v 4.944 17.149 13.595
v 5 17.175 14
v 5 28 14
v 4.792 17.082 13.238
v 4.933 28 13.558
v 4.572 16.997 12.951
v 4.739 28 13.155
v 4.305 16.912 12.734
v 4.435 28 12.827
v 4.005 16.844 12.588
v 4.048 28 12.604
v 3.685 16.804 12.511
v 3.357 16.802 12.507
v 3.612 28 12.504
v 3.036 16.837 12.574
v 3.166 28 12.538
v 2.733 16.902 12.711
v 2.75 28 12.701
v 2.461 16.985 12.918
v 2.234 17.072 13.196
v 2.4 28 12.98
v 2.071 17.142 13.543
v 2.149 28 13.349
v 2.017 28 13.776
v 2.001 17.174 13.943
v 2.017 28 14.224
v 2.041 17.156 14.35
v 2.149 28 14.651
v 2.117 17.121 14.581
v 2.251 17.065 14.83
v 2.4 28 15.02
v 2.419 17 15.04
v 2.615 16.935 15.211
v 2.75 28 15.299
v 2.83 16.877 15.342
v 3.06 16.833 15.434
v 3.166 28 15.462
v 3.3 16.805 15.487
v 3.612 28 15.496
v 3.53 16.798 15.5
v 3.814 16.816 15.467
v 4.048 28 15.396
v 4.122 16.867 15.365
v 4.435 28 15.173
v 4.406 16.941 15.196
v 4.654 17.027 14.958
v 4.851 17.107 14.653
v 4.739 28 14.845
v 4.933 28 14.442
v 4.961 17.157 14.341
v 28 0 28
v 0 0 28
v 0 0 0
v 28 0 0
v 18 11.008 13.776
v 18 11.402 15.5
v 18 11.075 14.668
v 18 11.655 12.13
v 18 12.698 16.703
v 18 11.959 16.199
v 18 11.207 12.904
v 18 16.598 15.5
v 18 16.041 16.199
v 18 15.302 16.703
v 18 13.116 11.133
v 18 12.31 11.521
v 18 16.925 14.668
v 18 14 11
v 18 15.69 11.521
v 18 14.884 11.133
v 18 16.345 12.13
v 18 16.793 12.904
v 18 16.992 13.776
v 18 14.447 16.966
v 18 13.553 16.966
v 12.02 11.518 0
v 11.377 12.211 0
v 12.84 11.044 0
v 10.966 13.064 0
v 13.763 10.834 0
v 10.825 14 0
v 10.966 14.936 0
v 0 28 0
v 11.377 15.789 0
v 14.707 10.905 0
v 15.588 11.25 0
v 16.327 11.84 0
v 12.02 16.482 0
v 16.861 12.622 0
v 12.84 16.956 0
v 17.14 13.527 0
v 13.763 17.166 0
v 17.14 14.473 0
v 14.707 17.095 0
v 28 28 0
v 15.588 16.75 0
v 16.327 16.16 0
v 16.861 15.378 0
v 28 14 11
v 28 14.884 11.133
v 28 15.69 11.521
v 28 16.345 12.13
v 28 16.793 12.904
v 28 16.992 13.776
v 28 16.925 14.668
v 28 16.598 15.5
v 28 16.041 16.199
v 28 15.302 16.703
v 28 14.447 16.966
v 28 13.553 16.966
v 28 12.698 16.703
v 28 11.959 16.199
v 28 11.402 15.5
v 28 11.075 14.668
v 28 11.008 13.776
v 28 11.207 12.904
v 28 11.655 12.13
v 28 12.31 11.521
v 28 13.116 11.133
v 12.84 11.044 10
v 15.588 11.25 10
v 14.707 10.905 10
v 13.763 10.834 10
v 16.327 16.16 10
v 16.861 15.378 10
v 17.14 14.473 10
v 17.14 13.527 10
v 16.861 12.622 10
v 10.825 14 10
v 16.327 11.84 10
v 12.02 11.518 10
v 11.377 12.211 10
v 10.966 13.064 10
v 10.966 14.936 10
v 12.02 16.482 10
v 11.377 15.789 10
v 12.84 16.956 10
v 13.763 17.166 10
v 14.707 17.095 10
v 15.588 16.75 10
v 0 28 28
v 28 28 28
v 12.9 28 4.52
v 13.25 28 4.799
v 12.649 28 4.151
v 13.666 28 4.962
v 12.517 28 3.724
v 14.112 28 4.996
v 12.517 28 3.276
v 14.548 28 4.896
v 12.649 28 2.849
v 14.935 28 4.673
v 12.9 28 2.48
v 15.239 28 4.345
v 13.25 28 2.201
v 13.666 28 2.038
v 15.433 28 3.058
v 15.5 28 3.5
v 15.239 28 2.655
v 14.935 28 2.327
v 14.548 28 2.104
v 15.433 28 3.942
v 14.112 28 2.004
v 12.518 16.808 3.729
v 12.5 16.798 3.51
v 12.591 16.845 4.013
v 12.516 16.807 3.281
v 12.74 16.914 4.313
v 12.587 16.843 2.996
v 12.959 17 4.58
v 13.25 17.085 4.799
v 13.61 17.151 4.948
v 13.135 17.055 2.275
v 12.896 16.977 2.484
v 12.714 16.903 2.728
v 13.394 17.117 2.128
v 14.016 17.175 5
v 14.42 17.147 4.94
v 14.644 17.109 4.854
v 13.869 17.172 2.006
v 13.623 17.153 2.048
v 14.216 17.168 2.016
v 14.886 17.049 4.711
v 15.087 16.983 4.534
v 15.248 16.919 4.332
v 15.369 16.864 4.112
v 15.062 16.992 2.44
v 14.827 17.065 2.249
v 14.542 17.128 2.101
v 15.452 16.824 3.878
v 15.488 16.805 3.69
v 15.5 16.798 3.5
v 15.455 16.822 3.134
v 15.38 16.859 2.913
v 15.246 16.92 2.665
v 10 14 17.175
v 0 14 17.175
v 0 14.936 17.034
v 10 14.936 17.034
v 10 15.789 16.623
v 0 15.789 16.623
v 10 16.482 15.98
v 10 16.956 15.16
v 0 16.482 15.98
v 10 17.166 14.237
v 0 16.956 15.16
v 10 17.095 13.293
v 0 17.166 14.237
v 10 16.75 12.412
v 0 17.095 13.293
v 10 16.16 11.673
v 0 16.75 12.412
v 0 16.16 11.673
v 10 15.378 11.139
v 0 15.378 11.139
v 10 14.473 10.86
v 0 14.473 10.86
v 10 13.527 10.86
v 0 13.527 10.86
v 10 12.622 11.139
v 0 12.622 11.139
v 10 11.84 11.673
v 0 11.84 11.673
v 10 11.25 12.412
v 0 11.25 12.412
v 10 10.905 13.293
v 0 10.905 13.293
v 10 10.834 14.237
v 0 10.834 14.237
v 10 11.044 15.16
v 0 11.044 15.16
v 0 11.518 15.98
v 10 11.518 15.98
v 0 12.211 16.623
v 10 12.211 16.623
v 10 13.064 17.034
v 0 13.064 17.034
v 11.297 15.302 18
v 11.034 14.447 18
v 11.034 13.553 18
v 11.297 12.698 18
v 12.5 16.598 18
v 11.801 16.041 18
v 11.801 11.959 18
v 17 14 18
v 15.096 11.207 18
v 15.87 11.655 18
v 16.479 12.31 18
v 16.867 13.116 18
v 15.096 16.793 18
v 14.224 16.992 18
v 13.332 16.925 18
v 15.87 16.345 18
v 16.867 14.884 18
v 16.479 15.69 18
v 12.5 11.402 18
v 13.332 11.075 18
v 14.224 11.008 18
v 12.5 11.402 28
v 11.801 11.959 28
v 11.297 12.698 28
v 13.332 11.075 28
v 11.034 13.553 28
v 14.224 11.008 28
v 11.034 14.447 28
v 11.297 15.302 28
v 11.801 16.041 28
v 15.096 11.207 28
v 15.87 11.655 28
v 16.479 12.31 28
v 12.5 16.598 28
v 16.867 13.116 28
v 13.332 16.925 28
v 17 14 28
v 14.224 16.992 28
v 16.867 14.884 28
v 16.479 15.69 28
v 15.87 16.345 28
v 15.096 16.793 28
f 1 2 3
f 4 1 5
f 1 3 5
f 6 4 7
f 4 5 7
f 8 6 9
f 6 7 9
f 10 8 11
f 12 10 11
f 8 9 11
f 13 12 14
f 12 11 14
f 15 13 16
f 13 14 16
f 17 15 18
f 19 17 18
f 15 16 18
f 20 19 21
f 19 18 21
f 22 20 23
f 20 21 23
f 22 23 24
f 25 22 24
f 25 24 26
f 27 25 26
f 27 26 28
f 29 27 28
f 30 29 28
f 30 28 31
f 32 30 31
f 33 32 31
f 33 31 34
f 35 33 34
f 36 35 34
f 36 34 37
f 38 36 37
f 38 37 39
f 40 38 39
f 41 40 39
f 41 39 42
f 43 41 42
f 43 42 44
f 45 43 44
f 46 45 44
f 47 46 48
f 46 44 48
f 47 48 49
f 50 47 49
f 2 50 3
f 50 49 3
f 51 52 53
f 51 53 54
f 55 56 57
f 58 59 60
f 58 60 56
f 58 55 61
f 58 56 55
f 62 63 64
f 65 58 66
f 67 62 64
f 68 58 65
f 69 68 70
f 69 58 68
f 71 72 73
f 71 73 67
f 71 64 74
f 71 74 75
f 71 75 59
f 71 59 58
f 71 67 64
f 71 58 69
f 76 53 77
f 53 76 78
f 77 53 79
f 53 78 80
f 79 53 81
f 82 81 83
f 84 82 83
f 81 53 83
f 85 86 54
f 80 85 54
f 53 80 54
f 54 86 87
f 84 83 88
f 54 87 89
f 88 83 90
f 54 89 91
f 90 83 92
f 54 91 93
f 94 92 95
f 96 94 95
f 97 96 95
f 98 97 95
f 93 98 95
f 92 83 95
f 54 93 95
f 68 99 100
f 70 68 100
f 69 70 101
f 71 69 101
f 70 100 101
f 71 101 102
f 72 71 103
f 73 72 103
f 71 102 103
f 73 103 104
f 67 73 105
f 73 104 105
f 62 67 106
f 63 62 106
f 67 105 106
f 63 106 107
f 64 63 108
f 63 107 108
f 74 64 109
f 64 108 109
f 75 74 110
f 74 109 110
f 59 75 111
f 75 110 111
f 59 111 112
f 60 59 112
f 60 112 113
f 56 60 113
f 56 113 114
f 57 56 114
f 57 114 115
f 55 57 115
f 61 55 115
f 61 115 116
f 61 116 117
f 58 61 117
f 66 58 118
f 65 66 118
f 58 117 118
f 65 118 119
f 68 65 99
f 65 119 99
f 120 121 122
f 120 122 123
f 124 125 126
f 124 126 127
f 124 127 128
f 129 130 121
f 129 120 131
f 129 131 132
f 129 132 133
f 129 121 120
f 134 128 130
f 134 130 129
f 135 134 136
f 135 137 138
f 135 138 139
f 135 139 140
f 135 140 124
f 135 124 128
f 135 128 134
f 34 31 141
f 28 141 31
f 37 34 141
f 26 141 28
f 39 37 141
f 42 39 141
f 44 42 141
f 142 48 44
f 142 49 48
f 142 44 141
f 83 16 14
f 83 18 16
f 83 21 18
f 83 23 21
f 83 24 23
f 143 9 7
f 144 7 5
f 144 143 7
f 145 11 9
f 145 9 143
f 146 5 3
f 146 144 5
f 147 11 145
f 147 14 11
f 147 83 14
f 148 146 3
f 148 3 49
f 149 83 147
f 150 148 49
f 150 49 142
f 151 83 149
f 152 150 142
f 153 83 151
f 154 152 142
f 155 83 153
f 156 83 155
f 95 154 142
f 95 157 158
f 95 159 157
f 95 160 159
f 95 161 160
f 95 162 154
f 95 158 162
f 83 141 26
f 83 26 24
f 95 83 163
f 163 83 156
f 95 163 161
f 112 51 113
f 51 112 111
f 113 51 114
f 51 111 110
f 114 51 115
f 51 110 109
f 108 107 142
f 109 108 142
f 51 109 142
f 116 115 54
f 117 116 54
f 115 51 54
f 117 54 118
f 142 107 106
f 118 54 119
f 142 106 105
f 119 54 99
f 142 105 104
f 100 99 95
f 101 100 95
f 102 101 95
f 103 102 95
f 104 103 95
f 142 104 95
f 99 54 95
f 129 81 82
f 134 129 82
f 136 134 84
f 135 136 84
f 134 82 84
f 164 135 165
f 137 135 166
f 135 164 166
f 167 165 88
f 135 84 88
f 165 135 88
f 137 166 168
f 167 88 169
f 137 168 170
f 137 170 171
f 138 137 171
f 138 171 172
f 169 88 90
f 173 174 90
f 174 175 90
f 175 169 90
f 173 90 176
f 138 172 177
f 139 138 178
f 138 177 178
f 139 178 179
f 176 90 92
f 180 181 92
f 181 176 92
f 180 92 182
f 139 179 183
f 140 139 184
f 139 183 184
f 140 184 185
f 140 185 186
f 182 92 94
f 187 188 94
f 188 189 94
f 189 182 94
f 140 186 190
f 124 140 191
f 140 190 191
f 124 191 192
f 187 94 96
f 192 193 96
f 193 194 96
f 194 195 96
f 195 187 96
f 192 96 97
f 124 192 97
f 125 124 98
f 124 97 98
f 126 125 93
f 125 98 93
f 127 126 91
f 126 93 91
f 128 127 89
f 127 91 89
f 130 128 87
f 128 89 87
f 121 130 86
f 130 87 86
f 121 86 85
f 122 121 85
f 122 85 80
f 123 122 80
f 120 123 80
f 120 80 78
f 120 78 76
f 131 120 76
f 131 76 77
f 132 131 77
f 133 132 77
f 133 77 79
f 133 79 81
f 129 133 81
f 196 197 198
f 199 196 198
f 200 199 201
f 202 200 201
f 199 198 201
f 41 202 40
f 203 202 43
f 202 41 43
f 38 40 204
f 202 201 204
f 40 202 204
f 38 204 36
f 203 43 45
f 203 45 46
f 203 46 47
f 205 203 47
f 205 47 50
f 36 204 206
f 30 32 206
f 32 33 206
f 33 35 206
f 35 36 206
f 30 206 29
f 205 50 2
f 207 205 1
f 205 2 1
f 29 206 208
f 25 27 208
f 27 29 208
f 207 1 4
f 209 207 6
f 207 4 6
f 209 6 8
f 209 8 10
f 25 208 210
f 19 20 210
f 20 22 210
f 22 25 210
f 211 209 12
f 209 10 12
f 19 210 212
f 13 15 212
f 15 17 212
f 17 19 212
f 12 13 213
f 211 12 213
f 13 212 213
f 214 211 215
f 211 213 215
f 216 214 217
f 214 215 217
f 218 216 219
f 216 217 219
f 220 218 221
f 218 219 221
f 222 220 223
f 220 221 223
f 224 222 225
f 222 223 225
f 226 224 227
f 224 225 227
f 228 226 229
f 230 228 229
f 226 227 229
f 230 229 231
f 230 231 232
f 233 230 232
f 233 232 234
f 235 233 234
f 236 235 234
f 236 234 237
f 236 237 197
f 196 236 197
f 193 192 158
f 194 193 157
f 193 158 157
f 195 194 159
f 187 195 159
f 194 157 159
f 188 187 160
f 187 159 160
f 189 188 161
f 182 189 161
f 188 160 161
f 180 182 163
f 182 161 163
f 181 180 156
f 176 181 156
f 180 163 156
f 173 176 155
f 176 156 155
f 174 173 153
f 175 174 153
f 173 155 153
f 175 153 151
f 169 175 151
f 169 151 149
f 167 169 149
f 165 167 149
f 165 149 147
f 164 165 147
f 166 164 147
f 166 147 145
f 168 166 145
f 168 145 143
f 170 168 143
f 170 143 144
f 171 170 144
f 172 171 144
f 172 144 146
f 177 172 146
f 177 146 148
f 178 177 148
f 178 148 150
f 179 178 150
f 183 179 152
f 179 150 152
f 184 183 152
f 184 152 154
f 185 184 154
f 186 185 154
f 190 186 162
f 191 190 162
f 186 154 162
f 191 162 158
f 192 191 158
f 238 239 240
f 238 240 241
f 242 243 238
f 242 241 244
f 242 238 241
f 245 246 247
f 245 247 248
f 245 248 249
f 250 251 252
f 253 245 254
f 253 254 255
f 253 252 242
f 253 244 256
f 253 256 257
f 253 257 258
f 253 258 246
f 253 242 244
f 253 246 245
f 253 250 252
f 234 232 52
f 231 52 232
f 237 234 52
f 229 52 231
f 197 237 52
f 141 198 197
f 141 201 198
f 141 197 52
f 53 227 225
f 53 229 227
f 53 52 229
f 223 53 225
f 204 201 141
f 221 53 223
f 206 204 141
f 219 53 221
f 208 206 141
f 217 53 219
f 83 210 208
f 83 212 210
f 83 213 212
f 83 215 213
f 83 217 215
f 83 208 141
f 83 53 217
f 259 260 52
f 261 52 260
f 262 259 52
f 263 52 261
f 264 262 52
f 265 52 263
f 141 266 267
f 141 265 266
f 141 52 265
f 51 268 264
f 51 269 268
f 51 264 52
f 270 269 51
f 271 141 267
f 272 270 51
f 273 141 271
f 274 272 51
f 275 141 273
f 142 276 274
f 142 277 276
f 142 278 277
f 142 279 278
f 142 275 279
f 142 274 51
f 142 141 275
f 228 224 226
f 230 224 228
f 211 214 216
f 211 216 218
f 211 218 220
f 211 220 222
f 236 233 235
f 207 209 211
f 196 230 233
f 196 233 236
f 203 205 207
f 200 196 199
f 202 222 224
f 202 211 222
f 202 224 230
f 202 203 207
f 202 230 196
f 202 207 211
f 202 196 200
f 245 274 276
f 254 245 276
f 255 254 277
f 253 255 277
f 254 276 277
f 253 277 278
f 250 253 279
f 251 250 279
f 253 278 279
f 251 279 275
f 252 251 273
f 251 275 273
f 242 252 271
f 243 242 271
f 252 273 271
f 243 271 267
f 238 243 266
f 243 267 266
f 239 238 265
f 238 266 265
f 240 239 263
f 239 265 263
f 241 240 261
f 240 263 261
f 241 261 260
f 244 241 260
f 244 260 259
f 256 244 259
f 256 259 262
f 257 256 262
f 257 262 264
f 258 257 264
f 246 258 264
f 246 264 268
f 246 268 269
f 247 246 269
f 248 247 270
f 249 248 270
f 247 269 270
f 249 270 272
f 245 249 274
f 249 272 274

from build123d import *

# Parameters (mm, degrees)
CROQUIS1_W              = 28
CROQUIS1_H              = 28
SALIENTE_EXTRUIR1_DEPTH = 28
CROQUIS4_R              = 3.175
CORTAR_EXTRUIR3_DEPTH   = 10
CROQUIS6_R              = 3
CORTAR_EXTRUIR4_DEPTH   = 10
CROQUIS8_R              = 3.175
CORTAR_EXTRUIR5_DEPTH   = 10
CROQUIS9_R              = 3
CORTAR_EXTRUIR6_DEPTH   = 10
CROQUIS10_R             = 1.5
CORTAR_EXTRUIR7_DEPTH   = 12


with BuildPart() as part:
    # Croquis1 → Saliente-Extruir1 (new body)
    with BuildSketch(Plane.XY):
        with Locations((14, 14)):
            Rectangle(CROQUIS1_W, CROQUIS1_H)
    extrude(amount=SALIENTE_EXTRUIR1_DEPTH)

    # Croquis4 → Cortar-Extruir3 (cut)
    with BuildSketch(Plane.ZY):
        with Locations((14, 14)):
            Circle(CROQUIS4_R)
    extrude(amount=-CORTAR_EXTRUIR3_DEPTH, mode=Mode.SUBTRACT)

    # Croquis6 → Cortar-Extruir4 (cut)
    with BuildSketch(Plane(origin=(28, 0, 0), x_dir=(0, 0, -1), z_dir=(1, 0, 0))):
        with Locations((-14, 14)):
            Circle(CROQUIS6_R)
    extrude(amount=-CORTAR_EXTRUIR4_DEPTH, mode=Mode.SUBTRACT)

    # Croquis8 → Cortar-Extruir5 (cut)
    with BuildSketch(Plane(origin=(0, 0, 0), x_dir=(-1, 0, 0), z_dir=(0, 0, -1))):
        with Locations((-14, 14)):
            Circle(CROQUIS8_R)
    extrude(amount=-CORTAR_EXTRUIR5_DEPTH, mode=Mode.SUBTRACT)

    # Croquis9 → Cortar-Extruir6 (cut)
    with BuildSketch(Plane.XY.offset(28)):
        with Locations((14, 14)):
            Circle(CROQUIS9_R)
    extrude(amount=-CORTAR_EXTRUIR6_DEPTH, mode=Mode.SUBTRACT)

    # Croquis10 → Cortar-Extruir7 (cut)
    with BuildSketch(Plane(origin=(0, 28, 0), x_dir=(1, 0, 0), z_dir=(0, 1, 0))):
        with Locations((3.5, -14)):
            Circle(CROQUIS10_R)
        with Locations((14, -3.5)):
            Circle(CROQUIS10_R)
    extrude(amount=-CORTAR_EXTRUIR7_DEPTH, mode=Mode.SUBTRACT)


solid = part.part
